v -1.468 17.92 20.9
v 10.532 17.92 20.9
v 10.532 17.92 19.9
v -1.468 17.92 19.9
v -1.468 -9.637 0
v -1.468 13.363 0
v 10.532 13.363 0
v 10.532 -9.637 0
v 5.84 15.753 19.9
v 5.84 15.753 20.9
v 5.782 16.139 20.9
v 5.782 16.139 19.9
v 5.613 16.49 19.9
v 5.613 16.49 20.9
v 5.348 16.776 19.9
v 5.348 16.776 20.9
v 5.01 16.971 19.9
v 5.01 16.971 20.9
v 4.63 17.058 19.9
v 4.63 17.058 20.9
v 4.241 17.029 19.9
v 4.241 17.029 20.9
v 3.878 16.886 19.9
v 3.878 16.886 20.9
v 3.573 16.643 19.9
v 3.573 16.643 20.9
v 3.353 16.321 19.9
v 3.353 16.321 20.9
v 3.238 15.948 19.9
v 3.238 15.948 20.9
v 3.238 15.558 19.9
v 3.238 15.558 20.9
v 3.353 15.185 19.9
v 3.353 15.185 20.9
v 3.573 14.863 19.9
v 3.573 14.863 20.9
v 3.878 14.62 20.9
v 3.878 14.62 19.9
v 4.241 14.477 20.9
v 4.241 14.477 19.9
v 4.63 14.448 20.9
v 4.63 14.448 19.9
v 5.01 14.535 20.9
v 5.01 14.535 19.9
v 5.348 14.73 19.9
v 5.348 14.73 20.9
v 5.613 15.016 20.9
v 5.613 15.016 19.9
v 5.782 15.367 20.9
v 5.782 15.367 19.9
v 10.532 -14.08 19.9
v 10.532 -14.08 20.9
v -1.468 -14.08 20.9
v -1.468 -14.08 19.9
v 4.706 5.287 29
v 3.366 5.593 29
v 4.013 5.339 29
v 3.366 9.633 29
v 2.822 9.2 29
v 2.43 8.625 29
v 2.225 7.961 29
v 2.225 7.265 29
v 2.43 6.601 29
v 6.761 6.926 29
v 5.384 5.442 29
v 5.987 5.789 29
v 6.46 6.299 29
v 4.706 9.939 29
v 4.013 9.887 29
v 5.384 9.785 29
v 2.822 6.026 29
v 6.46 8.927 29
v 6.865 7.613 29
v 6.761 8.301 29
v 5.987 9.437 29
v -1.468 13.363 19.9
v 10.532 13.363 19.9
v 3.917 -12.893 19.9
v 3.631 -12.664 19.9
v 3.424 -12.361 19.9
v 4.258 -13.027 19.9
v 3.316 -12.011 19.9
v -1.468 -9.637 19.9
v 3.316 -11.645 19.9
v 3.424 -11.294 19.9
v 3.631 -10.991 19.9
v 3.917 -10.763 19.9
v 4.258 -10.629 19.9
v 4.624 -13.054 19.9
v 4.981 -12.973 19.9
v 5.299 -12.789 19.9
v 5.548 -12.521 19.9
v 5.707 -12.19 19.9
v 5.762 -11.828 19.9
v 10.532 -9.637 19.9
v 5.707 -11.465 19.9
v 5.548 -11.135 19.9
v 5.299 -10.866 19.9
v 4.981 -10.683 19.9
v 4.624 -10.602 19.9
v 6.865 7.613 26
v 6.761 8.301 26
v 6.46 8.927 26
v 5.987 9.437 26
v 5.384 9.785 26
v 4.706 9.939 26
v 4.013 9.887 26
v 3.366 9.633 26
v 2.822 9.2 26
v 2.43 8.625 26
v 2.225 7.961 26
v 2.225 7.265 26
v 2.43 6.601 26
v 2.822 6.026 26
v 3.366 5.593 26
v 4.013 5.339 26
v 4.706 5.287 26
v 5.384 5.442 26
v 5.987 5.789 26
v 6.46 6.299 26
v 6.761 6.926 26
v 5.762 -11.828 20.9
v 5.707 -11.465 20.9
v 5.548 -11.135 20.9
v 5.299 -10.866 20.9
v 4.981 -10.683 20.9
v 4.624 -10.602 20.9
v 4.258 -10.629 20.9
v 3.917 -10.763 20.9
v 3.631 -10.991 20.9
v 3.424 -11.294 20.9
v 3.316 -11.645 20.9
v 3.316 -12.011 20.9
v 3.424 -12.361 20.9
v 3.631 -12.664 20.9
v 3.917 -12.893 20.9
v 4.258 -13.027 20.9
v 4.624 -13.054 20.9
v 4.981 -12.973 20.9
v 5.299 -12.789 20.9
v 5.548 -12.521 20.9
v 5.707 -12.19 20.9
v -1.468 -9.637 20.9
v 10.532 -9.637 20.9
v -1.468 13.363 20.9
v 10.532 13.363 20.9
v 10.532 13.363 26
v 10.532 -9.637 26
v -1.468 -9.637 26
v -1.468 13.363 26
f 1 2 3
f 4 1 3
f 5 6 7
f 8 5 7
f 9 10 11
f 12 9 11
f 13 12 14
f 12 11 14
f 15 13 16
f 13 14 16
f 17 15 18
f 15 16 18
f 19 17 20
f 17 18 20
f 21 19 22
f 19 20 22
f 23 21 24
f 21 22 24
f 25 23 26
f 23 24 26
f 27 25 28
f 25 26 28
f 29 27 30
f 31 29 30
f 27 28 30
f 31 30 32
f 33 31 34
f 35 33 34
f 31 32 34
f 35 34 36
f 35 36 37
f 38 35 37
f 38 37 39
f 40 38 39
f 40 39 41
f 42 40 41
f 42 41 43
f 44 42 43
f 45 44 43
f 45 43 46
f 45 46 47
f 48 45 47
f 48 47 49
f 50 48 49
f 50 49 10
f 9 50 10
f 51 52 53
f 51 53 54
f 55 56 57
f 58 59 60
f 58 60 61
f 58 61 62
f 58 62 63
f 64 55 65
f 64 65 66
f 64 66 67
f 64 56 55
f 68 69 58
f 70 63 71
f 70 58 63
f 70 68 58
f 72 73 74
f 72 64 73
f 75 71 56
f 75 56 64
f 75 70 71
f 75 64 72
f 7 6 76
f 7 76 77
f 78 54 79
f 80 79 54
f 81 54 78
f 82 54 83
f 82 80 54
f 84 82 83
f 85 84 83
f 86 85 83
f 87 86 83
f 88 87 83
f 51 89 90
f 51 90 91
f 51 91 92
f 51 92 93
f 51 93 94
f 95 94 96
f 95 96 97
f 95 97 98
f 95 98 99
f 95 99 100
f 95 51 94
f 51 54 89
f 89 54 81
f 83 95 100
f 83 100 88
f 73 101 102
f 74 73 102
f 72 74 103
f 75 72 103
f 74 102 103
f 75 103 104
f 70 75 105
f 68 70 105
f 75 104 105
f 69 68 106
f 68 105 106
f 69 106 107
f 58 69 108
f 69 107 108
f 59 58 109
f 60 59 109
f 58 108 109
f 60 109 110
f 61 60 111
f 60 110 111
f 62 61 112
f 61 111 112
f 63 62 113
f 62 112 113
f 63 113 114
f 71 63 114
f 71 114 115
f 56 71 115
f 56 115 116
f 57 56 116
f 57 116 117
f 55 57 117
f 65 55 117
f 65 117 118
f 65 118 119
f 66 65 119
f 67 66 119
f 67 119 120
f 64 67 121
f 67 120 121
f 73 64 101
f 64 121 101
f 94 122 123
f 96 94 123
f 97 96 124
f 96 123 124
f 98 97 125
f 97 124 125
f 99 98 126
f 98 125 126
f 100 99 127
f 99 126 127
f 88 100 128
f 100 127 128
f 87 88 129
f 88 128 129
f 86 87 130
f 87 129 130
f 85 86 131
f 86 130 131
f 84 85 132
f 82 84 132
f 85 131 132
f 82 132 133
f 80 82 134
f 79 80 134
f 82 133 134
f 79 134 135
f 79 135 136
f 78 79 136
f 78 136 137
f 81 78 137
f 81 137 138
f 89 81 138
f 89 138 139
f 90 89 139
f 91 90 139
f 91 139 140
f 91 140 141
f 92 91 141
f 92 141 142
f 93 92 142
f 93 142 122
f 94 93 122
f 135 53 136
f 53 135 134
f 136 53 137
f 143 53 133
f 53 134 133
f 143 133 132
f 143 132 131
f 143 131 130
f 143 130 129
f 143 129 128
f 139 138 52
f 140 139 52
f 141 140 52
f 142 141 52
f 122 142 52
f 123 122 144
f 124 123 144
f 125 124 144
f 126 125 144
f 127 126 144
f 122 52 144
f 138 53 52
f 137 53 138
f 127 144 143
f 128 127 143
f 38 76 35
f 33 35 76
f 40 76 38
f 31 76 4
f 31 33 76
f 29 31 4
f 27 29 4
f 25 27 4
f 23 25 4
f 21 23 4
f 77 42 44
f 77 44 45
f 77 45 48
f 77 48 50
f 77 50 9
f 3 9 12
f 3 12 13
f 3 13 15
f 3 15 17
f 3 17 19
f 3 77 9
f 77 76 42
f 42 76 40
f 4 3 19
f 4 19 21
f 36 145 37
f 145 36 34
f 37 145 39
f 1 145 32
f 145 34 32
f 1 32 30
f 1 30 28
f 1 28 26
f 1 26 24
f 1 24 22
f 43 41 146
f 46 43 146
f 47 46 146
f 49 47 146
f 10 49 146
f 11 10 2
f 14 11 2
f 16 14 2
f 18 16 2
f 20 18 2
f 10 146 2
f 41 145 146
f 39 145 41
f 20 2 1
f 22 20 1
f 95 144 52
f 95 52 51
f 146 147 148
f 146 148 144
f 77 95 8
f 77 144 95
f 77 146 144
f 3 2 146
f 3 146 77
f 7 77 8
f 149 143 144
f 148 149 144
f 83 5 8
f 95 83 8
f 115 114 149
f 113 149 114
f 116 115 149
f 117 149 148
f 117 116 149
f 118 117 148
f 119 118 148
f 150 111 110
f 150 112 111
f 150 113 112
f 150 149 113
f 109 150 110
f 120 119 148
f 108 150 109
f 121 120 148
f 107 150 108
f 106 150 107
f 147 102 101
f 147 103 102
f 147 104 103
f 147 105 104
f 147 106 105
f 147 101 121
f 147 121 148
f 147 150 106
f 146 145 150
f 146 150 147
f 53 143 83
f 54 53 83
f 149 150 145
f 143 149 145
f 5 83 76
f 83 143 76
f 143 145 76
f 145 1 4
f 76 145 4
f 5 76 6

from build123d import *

# Parameters (mm, degrees)
SKETCH_1_W          = 12
SKETCH_1_H          = 23
EXTRUDE_1_DEPTH     = 26
SKETCH_2_R          = 2.332740267
EXTRUDE_2_DEPTH     = 3
SKETCH_3_W          = 1
SKETCH_3_H          = 32
EXTRUDE_3_DEPTH     = 12
SKETCH_4_R          = 1.308316264
SKETCH_4_R_2        = 1.22970194
CUT_EXTRUDE_1_DEPTH = 10


with BuildPart() as part:
    # 草图1 → 凸台-拉伸1 (new body)
    with BuildSketch(Plane.XY):
        with Locations((4.532123023, 1.863128492)):
            Rectangle(SKETCH_1_W, SKETCH_1_H)
    extrude(amount=EXTRUDE_1_DEPTH)

    # 草图2 → 凸台-拉伸2 (add)
    with BuildSketch(Plane.XY.offset(26)):
        with Locations((4.532123023, 7.613128492)):
            Circle(SKETCH_2_R)
    extrude(amount=EXTRUDE_2_DEPTH)

    # 草图3 → 凸台-拉伸3 (add)
    with BuildSketch(Plane(origin=(10.532123023, 0, 0), x_dir=(0, 0, -1), z_dir=(1, 0, 0))):
        with Locations((-20.4, 1.919988583)):
            Rectangle(SKETCH_3_W, SKETCH_3_H)
    extrude(amount=-EXTRUDE_3_DEPTH)

    # 草图4 → 切除-拉伸1 (cut)
    with BuildSketch(Plane.XY.offset(20.9)):
        with Locations((4.532123023, 15.753010852)):
            Circle(SKETCH_4_R)
        with Locations((4.532123023, -11.827886658)):
            Circle(SKETCH_4_R_2)
    extrude(amount=-CUT_EXTRUDE_1_DEPTH, mode=Mode.SUBTRACT)


solid = part.part
